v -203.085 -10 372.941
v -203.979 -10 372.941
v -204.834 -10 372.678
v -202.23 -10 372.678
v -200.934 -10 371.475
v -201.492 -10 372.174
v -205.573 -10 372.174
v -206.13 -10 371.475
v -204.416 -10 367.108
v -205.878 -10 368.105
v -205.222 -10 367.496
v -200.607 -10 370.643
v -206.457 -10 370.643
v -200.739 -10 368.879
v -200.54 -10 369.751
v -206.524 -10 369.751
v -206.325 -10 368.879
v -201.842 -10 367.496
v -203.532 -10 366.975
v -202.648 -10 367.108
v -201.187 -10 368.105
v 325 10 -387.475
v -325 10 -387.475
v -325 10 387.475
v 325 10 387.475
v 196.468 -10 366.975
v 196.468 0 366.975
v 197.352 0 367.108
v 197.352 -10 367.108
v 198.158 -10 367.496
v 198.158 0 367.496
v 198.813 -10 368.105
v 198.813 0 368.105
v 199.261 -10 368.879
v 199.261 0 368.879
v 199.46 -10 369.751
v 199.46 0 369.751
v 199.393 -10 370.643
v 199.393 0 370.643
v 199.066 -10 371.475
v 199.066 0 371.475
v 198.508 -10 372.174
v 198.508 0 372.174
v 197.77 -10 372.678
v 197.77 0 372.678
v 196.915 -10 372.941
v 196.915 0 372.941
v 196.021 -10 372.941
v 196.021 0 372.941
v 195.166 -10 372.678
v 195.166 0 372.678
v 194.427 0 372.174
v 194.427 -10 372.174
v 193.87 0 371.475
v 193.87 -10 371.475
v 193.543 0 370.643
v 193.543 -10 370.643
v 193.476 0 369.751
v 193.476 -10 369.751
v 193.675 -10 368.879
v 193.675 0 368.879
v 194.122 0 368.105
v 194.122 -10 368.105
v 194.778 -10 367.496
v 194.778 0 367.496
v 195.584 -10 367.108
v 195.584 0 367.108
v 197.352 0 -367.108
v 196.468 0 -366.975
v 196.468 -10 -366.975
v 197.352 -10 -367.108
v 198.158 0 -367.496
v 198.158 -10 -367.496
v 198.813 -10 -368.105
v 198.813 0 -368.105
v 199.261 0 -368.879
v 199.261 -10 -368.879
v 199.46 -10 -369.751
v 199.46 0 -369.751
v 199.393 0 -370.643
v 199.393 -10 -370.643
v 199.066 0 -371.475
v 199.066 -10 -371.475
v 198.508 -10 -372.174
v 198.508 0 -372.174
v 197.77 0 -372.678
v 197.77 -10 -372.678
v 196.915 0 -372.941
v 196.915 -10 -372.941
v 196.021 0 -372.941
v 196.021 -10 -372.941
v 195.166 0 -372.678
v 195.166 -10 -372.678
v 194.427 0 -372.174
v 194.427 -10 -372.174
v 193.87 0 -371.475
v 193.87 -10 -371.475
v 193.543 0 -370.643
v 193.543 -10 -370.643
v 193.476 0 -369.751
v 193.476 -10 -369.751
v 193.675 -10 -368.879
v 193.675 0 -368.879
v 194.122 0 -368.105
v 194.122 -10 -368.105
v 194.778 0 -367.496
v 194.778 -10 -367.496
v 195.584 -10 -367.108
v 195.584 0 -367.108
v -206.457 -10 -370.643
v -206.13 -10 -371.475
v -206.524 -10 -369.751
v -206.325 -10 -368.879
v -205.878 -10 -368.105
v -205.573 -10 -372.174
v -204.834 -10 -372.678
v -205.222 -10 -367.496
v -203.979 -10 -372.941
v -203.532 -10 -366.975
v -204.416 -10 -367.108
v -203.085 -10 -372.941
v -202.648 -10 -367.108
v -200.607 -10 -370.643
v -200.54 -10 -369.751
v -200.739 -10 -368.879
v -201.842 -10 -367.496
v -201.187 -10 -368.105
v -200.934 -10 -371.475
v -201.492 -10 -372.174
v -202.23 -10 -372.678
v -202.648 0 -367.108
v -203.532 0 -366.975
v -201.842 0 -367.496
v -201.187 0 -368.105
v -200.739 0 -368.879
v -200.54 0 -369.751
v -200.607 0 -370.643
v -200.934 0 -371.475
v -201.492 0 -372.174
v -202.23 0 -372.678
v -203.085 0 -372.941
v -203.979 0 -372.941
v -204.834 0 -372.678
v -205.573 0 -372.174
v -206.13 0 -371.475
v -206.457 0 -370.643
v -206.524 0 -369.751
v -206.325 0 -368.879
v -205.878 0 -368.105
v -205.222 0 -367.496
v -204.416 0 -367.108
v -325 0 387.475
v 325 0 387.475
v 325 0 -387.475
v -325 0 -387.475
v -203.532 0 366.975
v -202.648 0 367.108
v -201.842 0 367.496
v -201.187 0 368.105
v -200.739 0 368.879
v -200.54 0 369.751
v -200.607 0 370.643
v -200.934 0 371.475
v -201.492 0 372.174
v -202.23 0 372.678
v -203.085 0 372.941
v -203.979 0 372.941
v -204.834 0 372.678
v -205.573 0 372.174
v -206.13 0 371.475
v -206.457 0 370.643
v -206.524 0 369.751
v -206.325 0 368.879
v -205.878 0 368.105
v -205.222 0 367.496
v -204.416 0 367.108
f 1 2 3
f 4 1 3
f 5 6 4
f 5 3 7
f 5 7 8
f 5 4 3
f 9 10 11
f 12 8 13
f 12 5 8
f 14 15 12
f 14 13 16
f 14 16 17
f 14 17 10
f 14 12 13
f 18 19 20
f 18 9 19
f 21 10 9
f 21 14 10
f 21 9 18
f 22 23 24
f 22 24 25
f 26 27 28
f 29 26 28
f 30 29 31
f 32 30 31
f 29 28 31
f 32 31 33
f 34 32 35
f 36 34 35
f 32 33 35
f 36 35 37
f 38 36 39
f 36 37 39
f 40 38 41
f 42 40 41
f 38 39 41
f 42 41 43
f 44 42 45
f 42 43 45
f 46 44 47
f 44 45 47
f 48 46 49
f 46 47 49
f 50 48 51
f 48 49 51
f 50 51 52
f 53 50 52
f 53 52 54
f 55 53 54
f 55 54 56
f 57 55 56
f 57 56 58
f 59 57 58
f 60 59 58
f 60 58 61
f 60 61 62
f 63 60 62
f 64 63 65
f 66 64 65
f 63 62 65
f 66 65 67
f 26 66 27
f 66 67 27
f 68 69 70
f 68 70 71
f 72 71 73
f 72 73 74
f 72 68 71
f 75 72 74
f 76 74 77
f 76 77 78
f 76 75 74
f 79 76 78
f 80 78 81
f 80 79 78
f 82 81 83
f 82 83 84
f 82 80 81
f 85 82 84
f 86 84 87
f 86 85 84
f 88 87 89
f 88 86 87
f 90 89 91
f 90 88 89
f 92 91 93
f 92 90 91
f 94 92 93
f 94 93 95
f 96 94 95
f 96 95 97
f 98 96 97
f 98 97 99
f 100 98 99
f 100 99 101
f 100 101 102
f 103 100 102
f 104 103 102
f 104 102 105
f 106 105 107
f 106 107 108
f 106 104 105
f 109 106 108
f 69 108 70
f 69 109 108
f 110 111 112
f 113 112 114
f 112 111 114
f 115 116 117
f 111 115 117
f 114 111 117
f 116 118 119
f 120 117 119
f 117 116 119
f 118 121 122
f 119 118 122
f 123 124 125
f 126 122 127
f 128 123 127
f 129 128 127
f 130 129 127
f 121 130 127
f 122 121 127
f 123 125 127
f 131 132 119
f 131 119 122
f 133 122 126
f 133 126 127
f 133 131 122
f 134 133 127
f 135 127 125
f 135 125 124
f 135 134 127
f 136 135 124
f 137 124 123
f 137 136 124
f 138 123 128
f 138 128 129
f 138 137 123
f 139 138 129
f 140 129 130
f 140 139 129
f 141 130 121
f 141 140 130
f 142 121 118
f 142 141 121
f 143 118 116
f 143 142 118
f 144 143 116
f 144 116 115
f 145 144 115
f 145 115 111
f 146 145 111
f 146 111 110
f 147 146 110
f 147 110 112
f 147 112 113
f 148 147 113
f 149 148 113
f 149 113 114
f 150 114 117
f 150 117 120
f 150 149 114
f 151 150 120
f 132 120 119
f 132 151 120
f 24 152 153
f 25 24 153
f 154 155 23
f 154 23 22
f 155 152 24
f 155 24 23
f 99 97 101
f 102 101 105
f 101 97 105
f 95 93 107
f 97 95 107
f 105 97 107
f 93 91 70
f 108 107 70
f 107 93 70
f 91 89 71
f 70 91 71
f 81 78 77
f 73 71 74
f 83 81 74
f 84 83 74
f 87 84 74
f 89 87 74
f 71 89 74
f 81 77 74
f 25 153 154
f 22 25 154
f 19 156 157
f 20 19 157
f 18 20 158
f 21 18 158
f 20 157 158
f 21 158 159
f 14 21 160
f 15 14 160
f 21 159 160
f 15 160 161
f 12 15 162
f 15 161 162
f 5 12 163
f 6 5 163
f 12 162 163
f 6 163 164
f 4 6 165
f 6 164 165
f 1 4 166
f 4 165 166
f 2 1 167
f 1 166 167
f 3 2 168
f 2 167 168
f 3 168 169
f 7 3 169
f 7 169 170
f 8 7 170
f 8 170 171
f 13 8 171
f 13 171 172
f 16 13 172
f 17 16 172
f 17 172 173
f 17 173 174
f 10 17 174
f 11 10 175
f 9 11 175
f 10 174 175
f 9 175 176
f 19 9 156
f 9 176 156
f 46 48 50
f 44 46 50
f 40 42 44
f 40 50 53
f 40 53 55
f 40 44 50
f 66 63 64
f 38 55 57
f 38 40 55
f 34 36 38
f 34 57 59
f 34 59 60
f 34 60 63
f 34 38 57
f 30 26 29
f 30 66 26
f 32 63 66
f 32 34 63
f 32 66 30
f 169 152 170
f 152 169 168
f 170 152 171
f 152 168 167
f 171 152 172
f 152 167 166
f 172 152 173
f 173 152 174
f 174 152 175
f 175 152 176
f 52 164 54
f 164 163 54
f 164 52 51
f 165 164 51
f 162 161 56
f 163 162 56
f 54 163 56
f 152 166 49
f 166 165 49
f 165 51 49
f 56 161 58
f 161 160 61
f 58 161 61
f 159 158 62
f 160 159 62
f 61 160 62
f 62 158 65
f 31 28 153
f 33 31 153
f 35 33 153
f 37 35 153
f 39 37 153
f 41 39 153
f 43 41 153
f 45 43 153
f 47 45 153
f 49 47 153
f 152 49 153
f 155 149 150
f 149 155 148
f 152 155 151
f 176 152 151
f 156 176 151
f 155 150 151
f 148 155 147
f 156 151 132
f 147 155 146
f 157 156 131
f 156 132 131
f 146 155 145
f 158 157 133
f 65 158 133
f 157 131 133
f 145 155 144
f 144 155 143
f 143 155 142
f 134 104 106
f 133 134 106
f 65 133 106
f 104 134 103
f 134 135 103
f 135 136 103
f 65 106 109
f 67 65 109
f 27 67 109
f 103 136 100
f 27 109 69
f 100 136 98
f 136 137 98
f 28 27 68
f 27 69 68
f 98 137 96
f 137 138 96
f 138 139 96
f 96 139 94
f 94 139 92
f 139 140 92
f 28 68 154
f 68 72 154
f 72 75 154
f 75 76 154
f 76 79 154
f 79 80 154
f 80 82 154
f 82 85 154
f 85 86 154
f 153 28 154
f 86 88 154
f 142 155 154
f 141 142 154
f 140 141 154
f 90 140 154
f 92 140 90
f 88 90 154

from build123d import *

# Parameters (mm, degrees)
SKETCH1_W           = 650
SKETCH1_H           = 774.95
BOSS_EXTRUDE1_DEPTH = 10
SKETCH2_R           = 3
BOSS_EXTRUDE2_DEPTH = 10


with BuildPart() as part:
    # Sketch1 → Boss-Extrude1 (new body)
    with BuildSketch(Plane(origin=(0, 0, 0), x_dir=(1, 0, 0), z_dir=(0, 1, 0))):
        Rectangle(SKETCH1_W, SKETCH1_H)
    extrude(amount=BOSS_EXTRUDE1_DEPTH)

    # Sketch2 → Boss-Extrude2 (add)
    with BuildSketch(Plane.XZ):
        with Locations(Location((-203.532027454, 369.975, 0), (0, 0, 270))):
            Circle(SKETCH2_R)
        with Locations(Location((196.467972546, 369.975, 0), (0, 0, 270))):
            Circle(SKETCH2_R)
    boss_extrude2 = extrude(amount=BOSS_EXTRUDE2_DEPTH)

    # Mirror1: Boss-Extrude2 across plane
    add(boss_extrude2.mirror(Plane.XY))


solid = part.part
